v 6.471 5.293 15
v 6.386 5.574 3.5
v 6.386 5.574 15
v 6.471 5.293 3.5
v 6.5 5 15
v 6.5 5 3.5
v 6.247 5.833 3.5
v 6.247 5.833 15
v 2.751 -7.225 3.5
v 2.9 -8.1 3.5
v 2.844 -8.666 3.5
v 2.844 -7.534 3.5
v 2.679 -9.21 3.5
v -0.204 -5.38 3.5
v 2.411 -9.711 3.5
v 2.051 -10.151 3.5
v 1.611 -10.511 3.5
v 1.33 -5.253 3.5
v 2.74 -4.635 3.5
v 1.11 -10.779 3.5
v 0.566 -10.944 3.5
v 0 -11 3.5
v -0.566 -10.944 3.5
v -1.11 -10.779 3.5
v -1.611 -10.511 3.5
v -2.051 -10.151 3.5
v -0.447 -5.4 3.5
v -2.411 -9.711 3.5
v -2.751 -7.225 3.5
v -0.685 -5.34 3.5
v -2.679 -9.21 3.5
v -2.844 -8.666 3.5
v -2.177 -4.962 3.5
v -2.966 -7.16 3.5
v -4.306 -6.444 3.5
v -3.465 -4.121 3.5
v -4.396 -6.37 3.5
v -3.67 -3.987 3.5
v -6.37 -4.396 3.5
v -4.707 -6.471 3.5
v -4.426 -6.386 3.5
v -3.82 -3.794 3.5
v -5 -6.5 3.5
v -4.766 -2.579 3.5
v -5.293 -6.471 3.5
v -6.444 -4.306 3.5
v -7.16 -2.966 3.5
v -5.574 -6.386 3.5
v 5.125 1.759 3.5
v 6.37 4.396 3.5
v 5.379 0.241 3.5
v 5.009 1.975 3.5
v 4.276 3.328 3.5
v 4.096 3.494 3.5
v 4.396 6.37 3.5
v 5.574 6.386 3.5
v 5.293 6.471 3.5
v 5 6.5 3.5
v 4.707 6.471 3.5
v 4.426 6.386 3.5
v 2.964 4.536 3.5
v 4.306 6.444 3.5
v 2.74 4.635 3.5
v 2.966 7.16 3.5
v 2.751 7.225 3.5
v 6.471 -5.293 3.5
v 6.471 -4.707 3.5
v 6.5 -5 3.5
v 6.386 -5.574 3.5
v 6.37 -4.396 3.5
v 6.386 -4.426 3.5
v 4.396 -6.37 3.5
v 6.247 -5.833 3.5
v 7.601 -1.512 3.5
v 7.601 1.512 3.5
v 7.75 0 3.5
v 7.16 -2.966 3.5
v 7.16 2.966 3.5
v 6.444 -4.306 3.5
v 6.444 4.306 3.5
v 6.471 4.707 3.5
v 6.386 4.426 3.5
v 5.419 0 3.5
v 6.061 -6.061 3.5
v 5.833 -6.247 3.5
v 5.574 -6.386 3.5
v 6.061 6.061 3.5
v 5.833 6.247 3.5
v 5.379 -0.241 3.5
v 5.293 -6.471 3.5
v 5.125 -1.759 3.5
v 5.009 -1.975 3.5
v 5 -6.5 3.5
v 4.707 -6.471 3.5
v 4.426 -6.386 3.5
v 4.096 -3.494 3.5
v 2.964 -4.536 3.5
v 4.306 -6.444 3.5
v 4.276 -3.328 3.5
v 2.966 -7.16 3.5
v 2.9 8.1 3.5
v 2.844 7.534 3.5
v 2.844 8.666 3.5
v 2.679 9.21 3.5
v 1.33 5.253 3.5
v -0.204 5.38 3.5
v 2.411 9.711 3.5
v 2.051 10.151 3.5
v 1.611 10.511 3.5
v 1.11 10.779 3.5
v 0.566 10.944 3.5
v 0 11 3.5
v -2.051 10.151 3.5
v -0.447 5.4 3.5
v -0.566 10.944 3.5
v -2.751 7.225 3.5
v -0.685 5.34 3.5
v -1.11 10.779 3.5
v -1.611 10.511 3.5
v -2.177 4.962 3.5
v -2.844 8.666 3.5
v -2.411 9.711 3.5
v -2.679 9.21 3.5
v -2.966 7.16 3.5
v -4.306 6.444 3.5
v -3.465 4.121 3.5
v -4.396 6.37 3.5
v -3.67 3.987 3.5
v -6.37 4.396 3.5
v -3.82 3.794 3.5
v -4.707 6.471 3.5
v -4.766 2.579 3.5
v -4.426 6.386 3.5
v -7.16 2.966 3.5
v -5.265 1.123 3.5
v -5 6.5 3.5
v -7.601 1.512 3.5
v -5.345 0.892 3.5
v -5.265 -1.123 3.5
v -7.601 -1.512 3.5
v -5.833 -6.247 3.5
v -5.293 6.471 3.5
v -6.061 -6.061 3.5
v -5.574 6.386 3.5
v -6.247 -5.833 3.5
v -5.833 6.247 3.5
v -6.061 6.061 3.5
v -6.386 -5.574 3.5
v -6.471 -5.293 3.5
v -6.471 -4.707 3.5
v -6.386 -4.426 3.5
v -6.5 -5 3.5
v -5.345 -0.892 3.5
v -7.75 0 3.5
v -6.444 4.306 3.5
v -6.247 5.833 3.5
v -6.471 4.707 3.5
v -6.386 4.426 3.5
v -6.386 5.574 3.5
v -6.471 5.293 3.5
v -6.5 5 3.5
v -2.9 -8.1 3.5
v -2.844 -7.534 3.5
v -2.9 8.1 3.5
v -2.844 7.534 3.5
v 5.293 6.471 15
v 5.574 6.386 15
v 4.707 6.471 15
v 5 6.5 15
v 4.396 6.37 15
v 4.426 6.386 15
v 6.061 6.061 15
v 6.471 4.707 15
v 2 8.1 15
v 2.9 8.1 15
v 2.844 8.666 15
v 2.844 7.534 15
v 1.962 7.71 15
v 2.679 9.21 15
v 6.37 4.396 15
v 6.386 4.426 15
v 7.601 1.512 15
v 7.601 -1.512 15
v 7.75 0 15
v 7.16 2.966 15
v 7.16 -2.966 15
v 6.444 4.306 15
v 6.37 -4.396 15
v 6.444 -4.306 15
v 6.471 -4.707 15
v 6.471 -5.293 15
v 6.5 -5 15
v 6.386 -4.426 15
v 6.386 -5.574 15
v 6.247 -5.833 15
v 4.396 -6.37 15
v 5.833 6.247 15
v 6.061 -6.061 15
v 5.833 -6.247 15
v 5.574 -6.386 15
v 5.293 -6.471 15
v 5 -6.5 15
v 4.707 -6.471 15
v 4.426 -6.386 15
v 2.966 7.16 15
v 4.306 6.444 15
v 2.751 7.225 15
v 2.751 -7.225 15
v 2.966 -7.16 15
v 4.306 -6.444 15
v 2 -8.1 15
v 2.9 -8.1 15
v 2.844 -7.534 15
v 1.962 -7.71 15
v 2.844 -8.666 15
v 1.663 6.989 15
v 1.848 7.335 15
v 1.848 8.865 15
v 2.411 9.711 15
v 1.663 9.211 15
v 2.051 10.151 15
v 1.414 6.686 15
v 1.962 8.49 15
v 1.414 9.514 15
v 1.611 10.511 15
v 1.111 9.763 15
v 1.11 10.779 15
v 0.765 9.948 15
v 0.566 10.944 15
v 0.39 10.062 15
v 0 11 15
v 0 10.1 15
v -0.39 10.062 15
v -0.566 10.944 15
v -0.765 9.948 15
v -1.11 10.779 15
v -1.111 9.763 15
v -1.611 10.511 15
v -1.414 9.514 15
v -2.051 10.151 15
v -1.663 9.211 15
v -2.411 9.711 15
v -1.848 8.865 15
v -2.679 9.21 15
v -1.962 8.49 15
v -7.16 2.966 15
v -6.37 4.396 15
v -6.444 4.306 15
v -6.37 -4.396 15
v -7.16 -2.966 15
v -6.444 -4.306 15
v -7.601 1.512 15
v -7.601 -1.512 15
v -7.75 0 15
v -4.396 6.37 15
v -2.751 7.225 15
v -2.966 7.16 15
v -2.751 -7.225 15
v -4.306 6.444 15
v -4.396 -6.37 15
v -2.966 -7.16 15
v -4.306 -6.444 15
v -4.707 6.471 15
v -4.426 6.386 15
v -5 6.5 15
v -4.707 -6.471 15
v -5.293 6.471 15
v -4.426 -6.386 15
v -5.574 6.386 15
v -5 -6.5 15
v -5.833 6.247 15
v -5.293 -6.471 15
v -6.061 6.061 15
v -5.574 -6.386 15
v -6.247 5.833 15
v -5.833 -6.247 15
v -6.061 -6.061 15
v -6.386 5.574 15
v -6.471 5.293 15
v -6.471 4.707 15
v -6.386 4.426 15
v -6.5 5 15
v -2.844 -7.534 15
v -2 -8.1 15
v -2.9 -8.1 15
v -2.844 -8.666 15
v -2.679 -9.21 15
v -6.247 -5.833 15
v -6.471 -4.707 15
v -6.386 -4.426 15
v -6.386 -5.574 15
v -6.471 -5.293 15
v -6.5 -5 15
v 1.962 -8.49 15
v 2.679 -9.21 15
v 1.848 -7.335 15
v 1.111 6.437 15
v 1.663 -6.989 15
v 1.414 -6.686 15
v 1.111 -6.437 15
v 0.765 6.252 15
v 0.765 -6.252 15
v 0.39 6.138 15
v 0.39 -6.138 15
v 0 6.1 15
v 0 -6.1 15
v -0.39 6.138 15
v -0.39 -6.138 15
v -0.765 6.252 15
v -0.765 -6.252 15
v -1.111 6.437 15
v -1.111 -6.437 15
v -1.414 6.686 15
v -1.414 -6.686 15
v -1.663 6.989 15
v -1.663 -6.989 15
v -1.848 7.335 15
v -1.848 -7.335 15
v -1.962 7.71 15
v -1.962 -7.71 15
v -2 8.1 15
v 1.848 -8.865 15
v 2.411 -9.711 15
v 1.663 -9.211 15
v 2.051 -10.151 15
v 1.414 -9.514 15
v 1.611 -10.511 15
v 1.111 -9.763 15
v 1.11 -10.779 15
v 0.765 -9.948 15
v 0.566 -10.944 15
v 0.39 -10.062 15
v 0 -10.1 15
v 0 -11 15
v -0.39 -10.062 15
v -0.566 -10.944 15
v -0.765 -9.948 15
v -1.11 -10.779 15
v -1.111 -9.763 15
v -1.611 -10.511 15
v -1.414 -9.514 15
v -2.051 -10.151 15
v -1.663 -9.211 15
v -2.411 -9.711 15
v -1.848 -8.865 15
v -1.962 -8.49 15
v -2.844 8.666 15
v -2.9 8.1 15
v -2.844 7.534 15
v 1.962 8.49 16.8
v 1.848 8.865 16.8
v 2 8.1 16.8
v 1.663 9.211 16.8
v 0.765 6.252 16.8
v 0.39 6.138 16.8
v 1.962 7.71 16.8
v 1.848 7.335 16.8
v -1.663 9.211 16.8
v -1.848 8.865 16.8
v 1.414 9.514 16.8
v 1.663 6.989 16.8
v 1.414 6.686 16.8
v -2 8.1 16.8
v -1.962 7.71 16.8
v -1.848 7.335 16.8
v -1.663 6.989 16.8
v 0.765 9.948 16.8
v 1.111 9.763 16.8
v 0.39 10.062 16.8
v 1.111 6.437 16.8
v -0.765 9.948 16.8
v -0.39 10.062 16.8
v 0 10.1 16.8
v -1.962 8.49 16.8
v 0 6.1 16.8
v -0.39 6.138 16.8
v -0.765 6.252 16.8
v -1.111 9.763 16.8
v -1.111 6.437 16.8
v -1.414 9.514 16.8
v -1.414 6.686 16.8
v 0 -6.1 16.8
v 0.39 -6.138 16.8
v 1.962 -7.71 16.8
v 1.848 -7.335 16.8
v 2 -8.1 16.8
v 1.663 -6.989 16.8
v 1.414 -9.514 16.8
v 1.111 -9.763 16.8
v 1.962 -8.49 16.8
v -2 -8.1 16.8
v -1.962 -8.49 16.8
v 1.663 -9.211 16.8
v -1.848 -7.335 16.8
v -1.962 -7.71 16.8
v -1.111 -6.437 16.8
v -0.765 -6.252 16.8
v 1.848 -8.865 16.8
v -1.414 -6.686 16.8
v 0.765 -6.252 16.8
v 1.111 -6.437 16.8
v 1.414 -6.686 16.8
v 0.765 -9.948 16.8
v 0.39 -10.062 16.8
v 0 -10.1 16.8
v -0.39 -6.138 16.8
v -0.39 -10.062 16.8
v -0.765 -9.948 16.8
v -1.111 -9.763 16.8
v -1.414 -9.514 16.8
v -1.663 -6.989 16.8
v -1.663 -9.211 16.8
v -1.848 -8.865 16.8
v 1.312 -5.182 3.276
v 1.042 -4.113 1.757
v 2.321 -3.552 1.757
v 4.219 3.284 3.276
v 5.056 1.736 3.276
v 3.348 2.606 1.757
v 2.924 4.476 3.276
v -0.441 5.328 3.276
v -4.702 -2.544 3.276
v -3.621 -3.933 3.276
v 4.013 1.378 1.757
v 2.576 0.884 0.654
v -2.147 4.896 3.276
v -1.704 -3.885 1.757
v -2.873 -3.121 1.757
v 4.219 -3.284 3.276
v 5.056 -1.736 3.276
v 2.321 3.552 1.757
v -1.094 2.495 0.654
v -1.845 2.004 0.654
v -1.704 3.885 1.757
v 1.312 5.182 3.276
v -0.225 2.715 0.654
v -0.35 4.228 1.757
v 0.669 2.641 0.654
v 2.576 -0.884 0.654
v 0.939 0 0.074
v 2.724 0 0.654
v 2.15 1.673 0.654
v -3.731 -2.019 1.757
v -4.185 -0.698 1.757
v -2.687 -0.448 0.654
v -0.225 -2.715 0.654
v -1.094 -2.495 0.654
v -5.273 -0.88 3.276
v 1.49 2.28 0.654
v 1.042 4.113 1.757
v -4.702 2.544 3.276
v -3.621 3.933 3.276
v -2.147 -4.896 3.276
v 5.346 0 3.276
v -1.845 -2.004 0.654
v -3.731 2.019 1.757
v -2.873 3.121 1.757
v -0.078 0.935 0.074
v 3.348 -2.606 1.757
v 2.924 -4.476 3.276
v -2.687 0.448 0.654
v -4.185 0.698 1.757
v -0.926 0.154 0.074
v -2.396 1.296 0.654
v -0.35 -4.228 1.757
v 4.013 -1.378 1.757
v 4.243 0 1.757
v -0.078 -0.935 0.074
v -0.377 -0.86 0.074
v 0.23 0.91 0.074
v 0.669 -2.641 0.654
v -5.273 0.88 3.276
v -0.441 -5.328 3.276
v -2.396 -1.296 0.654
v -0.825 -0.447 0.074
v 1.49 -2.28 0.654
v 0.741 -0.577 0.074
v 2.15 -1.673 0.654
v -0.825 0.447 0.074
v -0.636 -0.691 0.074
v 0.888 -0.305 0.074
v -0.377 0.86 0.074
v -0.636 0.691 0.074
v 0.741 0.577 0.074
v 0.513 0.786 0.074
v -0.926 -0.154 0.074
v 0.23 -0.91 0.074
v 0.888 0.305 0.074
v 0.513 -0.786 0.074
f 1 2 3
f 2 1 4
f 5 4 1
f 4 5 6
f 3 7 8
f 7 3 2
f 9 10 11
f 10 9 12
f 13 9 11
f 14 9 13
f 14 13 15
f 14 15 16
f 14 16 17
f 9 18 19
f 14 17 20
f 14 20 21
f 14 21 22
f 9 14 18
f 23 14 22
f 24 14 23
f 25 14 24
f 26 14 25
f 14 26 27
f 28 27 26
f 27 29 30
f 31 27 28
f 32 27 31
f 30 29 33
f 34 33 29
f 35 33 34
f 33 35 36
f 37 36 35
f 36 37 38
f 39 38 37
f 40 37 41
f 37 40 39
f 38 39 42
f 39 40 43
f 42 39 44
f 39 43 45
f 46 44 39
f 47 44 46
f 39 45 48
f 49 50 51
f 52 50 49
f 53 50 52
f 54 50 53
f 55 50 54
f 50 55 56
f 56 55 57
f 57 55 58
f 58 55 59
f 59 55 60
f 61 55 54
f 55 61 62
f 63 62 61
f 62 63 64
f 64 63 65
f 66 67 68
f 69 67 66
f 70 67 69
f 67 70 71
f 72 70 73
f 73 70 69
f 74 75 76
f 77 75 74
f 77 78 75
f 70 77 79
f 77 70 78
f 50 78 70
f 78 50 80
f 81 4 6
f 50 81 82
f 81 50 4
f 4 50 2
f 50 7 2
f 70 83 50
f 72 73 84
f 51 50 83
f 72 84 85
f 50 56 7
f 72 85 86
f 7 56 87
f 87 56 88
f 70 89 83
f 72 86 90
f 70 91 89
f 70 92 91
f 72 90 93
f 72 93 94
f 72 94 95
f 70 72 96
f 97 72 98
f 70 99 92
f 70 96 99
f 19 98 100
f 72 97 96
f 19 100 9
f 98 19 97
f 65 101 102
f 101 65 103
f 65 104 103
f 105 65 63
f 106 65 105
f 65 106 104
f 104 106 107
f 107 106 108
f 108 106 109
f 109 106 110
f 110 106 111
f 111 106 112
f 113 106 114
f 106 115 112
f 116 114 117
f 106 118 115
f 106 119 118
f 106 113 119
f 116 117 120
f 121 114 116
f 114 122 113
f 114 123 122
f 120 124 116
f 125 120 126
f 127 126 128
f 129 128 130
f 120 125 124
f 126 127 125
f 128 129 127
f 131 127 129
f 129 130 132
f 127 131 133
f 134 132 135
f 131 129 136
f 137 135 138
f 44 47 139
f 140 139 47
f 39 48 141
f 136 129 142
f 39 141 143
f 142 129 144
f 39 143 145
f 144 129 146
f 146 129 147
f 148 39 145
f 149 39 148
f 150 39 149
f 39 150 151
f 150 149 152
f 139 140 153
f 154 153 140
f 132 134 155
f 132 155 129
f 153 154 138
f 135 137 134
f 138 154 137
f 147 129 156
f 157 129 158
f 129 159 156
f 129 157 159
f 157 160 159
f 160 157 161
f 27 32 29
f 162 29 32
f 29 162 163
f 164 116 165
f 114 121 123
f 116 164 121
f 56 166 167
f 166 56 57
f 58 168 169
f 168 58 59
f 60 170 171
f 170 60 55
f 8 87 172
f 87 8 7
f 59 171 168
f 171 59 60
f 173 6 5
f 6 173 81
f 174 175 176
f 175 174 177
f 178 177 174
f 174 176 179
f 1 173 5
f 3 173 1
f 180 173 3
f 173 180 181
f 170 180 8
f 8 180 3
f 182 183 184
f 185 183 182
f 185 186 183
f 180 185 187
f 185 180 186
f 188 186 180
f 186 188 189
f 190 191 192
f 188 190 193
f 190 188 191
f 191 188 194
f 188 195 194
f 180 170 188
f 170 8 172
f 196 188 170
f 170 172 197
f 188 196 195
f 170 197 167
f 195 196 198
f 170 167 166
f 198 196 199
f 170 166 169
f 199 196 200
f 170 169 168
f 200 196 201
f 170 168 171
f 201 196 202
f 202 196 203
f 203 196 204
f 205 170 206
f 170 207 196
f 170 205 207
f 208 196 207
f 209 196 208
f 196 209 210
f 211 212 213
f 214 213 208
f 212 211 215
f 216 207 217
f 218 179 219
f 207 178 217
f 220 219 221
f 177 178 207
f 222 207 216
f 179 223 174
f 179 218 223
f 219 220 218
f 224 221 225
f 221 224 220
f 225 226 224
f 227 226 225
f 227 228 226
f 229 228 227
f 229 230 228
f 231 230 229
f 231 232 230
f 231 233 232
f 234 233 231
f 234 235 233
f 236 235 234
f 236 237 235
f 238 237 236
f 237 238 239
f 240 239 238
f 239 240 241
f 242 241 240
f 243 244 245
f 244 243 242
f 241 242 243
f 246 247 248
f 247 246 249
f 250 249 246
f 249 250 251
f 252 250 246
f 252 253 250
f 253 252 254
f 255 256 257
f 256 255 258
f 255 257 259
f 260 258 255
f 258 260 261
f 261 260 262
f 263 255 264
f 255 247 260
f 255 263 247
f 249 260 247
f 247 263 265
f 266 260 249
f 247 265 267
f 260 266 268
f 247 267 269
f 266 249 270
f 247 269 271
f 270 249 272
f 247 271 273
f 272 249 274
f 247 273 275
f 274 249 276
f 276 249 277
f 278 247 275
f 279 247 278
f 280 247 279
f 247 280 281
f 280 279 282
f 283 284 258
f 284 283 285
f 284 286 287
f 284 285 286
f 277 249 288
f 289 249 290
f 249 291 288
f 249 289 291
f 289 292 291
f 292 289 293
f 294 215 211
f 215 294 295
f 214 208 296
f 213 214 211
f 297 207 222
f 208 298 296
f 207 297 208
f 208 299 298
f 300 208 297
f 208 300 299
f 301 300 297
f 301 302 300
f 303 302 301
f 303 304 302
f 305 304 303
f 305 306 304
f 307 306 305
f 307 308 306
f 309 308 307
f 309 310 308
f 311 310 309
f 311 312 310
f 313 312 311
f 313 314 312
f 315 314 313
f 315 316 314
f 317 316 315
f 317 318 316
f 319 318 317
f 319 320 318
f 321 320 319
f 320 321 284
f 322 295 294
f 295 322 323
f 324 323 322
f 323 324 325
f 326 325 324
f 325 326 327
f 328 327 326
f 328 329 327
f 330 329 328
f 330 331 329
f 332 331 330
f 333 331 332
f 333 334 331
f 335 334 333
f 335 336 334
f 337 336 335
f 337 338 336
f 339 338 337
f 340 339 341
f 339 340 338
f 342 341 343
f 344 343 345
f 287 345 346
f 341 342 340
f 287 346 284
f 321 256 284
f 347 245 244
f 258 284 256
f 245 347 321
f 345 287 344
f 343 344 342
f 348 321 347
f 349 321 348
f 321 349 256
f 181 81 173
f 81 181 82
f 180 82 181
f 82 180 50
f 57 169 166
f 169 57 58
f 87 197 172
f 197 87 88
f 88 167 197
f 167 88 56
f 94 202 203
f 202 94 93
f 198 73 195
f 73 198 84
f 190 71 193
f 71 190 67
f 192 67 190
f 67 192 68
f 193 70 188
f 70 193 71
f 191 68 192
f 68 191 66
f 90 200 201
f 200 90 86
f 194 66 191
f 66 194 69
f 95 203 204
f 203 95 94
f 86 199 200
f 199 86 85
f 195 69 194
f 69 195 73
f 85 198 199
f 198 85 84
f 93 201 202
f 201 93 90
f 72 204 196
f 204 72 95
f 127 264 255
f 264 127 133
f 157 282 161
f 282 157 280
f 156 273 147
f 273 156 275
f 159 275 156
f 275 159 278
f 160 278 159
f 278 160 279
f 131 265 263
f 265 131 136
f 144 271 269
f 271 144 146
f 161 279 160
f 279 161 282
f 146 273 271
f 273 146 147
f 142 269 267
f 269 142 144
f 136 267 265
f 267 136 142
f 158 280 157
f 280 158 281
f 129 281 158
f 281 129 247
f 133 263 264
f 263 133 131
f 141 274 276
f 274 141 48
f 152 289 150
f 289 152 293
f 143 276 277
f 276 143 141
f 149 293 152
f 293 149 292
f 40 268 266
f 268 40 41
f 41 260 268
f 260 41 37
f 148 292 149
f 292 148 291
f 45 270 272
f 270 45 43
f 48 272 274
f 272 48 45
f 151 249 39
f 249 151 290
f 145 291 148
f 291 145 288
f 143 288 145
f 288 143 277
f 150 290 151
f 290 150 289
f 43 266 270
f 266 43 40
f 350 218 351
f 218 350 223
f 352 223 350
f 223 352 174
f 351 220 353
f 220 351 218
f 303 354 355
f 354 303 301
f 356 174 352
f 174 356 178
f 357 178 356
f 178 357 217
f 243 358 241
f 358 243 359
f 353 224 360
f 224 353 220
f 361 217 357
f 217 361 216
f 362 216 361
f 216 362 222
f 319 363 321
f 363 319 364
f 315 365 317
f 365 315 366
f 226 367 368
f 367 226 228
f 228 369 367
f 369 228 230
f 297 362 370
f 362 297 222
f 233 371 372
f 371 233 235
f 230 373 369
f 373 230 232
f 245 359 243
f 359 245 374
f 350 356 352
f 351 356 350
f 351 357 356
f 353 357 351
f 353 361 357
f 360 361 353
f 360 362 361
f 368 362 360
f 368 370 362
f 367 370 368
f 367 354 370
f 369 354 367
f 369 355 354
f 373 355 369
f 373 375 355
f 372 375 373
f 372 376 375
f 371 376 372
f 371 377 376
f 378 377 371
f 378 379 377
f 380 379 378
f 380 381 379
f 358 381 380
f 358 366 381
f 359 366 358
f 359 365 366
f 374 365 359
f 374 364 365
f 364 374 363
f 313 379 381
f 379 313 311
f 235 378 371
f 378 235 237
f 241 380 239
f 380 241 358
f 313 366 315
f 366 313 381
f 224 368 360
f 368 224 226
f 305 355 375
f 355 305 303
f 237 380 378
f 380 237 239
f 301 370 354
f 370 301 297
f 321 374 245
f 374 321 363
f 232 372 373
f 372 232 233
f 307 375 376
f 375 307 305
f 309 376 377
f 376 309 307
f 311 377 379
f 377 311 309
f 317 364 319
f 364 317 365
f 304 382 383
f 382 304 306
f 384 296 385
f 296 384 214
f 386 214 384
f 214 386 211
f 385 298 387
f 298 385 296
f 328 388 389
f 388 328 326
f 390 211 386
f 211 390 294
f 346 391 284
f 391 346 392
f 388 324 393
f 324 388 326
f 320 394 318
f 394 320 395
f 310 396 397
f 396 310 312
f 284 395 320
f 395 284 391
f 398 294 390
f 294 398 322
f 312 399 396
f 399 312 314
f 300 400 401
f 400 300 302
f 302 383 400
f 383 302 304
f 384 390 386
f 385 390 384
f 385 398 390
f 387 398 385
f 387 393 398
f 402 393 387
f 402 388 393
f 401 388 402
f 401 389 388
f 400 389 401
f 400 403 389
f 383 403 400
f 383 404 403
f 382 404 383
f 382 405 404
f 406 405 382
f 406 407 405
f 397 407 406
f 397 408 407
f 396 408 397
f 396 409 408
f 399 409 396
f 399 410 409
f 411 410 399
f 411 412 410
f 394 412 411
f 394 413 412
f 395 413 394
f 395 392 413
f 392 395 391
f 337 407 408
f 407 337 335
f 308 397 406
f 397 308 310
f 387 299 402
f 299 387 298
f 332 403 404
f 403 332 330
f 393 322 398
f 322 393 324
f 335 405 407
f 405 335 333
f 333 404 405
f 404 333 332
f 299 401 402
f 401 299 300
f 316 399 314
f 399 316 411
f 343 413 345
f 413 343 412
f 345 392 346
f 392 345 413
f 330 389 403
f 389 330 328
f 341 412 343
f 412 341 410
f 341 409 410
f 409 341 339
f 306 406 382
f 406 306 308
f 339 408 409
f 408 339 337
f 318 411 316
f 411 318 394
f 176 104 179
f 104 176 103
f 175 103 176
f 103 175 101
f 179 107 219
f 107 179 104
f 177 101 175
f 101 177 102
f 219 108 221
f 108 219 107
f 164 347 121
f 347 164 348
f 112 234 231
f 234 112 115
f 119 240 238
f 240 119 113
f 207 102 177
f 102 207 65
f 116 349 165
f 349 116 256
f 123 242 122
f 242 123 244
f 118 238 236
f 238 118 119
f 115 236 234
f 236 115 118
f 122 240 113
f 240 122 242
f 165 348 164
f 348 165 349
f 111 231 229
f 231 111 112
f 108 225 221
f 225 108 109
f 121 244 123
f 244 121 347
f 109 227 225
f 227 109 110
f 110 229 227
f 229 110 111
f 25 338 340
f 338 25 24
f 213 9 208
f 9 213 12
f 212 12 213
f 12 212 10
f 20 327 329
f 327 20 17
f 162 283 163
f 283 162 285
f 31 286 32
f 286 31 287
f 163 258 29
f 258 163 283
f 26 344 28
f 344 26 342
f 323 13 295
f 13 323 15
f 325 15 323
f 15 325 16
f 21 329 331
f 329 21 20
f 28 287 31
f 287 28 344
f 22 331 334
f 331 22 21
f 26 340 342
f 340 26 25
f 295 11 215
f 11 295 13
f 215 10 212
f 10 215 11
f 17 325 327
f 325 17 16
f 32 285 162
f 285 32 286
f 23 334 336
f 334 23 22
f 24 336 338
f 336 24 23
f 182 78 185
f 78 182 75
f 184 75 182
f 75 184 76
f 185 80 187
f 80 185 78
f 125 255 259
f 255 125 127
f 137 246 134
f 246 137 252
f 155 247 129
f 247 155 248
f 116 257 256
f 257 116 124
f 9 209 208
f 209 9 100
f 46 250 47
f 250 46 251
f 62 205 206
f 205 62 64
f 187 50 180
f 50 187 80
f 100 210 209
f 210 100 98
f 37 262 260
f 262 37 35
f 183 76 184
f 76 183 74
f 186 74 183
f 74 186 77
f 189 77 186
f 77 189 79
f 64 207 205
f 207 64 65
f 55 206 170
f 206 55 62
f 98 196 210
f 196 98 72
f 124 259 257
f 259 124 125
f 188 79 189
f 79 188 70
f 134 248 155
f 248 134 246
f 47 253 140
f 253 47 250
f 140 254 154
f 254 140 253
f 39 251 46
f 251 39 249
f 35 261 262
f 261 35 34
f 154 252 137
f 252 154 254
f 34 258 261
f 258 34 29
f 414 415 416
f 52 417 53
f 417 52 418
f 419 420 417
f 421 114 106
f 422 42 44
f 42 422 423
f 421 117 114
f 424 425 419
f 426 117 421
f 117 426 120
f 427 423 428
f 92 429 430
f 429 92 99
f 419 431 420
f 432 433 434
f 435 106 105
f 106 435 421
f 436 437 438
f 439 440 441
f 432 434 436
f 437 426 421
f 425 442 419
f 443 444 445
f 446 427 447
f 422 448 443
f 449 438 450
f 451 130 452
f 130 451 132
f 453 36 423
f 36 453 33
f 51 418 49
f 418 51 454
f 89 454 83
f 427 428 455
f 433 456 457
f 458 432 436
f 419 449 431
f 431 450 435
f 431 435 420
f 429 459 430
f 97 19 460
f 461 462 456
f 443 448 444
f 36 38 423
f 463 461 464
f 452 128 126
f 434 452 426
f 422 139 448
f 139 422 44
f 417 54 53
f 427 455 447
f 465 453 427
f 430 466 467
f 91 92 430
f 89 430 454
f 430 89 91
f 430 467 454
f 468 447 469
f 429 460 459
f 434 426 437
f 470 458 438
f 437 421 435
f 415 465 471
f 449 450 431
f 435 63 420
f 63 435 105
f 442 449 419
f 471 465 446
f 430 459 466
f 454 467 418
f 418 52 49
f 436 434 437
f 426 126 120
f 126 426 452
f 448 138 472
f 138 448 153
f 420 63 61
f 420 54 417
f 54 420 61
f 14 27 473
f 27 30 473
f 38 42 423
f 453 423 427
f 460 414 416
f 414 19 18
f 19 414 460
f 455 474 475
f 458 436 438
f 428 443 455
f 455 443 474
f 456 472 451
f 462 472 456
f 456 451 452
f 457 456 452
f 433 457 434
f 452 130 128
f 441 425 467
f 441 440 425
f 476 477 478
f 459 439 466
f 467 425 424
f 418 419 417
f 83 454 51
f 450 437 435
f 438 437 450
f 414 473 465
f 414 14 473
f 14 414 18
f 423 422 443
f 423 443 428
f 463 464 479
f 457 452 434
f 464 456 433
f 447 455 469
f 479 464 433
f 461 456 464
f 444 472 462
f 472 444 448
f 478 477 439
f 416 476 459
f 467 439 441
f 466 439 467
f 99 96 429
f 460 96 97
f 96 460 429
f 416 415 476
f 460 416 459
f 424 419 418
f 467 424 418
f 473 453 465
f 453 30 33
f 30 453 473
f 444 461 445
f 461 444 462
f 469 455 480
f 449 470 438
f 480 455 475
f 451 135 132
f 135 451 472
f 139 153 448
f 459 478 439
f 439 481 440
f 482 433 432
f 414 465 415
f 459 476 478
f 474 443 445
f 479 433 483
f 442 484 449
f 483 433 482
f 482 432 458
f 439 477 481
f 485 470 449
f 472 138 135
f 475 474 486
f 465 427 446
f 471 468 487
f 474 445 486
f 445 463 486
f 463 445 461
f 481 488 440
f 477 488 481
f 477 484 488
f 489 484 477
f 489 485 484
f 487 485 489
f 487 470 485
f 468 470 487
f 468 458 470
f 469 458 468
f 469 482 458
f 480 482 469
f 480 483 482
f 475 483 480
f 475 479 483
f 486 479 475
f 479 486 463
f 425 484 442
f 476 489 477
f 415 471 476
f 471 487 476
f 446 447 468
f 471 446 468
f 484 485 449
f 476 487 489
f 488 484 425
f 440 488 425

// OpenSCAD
module bille() {
    rayon_bille=6;
    rayon_fixation_vis=2.9;
    rayon_corps=15.5/2;
    rayon_tete_vis=2;
    hauteur_corps=11.5;
    hauteur_fixation_vis=max(8.2,hauteur_corps);
    hauteur=15;
    largeur=22;
    hauteur_tete_vis=1.8;
    cote_carre=5;
    diamettre_petite_bille=1.5;
    //petite bille
    translate([cote_carre,cote_carre,hauteur-hauteur_corps]){
        cylinder(hauteur_corps,diamettre_petite_bille,diamettre_petite_bille,$fn=32);
    }
    translate([cote_carre,-cote_carre,hauteur-hauteur_corps]){
        cylinder(hauteur_corps,diamettre_petite_bille,diamettre_petite_bille,$fn=32);
    }
   translate([-cote_carre,cote_carre,hauteur-hauteur_corps]){
        cylinder(hauteur_corps,diamettre_petite_bille,diamettre_petite_bille,$fn=32);
    }
    translate([-cote_carre,-cote_carre,hauteur-hauteur_corps]){
        cylinder(hauteur_corps,diamettre_petite_bille,diamettre_petite_bille,$fn=32);
    }
    
    decallage_centre_vis=(largeur-(2*rayon_corps)-(2*rayon_fixation_vis))/2;
    //tete vis droite
    translate([0,decallage_centre_vis+rayon_corps,hauteur]){
        cylinder(hauteur_tete_vis,rayon_tete_vis,rayon_tete_vis,$fn=32);
    }
     //tete vis gauche
    translate([0,-1*(decallage_centre_vis+rayon_corps),hauteur]){
        cylinder(hauteur_tete_vis,rayon_tete_vis,rayon_tete_vis,$fn=32);
    }
   //fixation vis droite
    translate([0,decallage_centre_vis+rayon_corps,hauteur-hauteur_fixation_vis]){
        cylinder(hauteur_fixation_vis,rayon_fixation_vis,rayon_fixation_vis,$fn=32);
    }
    //fixation vis gauche
    translate([0,-1*(decallage_centre_vis+rayon_corps),hauteur-hauteur_fixation_vis]){
        cylinder(hauteur_fixation_vis,rayon_fixation_vis,rayon_fixation_vis,$fn=32);
    }
    //corps
    translate([0,0,hauteur-hauteur_corps]){
        cylinder(hauteur_corps,rayon_corps,rayon_corps,$fn=32);
    }
    //bille
    translate([0,0,rayon_bille]){
        sphere(rayon_bille);
    }
}


bille();
